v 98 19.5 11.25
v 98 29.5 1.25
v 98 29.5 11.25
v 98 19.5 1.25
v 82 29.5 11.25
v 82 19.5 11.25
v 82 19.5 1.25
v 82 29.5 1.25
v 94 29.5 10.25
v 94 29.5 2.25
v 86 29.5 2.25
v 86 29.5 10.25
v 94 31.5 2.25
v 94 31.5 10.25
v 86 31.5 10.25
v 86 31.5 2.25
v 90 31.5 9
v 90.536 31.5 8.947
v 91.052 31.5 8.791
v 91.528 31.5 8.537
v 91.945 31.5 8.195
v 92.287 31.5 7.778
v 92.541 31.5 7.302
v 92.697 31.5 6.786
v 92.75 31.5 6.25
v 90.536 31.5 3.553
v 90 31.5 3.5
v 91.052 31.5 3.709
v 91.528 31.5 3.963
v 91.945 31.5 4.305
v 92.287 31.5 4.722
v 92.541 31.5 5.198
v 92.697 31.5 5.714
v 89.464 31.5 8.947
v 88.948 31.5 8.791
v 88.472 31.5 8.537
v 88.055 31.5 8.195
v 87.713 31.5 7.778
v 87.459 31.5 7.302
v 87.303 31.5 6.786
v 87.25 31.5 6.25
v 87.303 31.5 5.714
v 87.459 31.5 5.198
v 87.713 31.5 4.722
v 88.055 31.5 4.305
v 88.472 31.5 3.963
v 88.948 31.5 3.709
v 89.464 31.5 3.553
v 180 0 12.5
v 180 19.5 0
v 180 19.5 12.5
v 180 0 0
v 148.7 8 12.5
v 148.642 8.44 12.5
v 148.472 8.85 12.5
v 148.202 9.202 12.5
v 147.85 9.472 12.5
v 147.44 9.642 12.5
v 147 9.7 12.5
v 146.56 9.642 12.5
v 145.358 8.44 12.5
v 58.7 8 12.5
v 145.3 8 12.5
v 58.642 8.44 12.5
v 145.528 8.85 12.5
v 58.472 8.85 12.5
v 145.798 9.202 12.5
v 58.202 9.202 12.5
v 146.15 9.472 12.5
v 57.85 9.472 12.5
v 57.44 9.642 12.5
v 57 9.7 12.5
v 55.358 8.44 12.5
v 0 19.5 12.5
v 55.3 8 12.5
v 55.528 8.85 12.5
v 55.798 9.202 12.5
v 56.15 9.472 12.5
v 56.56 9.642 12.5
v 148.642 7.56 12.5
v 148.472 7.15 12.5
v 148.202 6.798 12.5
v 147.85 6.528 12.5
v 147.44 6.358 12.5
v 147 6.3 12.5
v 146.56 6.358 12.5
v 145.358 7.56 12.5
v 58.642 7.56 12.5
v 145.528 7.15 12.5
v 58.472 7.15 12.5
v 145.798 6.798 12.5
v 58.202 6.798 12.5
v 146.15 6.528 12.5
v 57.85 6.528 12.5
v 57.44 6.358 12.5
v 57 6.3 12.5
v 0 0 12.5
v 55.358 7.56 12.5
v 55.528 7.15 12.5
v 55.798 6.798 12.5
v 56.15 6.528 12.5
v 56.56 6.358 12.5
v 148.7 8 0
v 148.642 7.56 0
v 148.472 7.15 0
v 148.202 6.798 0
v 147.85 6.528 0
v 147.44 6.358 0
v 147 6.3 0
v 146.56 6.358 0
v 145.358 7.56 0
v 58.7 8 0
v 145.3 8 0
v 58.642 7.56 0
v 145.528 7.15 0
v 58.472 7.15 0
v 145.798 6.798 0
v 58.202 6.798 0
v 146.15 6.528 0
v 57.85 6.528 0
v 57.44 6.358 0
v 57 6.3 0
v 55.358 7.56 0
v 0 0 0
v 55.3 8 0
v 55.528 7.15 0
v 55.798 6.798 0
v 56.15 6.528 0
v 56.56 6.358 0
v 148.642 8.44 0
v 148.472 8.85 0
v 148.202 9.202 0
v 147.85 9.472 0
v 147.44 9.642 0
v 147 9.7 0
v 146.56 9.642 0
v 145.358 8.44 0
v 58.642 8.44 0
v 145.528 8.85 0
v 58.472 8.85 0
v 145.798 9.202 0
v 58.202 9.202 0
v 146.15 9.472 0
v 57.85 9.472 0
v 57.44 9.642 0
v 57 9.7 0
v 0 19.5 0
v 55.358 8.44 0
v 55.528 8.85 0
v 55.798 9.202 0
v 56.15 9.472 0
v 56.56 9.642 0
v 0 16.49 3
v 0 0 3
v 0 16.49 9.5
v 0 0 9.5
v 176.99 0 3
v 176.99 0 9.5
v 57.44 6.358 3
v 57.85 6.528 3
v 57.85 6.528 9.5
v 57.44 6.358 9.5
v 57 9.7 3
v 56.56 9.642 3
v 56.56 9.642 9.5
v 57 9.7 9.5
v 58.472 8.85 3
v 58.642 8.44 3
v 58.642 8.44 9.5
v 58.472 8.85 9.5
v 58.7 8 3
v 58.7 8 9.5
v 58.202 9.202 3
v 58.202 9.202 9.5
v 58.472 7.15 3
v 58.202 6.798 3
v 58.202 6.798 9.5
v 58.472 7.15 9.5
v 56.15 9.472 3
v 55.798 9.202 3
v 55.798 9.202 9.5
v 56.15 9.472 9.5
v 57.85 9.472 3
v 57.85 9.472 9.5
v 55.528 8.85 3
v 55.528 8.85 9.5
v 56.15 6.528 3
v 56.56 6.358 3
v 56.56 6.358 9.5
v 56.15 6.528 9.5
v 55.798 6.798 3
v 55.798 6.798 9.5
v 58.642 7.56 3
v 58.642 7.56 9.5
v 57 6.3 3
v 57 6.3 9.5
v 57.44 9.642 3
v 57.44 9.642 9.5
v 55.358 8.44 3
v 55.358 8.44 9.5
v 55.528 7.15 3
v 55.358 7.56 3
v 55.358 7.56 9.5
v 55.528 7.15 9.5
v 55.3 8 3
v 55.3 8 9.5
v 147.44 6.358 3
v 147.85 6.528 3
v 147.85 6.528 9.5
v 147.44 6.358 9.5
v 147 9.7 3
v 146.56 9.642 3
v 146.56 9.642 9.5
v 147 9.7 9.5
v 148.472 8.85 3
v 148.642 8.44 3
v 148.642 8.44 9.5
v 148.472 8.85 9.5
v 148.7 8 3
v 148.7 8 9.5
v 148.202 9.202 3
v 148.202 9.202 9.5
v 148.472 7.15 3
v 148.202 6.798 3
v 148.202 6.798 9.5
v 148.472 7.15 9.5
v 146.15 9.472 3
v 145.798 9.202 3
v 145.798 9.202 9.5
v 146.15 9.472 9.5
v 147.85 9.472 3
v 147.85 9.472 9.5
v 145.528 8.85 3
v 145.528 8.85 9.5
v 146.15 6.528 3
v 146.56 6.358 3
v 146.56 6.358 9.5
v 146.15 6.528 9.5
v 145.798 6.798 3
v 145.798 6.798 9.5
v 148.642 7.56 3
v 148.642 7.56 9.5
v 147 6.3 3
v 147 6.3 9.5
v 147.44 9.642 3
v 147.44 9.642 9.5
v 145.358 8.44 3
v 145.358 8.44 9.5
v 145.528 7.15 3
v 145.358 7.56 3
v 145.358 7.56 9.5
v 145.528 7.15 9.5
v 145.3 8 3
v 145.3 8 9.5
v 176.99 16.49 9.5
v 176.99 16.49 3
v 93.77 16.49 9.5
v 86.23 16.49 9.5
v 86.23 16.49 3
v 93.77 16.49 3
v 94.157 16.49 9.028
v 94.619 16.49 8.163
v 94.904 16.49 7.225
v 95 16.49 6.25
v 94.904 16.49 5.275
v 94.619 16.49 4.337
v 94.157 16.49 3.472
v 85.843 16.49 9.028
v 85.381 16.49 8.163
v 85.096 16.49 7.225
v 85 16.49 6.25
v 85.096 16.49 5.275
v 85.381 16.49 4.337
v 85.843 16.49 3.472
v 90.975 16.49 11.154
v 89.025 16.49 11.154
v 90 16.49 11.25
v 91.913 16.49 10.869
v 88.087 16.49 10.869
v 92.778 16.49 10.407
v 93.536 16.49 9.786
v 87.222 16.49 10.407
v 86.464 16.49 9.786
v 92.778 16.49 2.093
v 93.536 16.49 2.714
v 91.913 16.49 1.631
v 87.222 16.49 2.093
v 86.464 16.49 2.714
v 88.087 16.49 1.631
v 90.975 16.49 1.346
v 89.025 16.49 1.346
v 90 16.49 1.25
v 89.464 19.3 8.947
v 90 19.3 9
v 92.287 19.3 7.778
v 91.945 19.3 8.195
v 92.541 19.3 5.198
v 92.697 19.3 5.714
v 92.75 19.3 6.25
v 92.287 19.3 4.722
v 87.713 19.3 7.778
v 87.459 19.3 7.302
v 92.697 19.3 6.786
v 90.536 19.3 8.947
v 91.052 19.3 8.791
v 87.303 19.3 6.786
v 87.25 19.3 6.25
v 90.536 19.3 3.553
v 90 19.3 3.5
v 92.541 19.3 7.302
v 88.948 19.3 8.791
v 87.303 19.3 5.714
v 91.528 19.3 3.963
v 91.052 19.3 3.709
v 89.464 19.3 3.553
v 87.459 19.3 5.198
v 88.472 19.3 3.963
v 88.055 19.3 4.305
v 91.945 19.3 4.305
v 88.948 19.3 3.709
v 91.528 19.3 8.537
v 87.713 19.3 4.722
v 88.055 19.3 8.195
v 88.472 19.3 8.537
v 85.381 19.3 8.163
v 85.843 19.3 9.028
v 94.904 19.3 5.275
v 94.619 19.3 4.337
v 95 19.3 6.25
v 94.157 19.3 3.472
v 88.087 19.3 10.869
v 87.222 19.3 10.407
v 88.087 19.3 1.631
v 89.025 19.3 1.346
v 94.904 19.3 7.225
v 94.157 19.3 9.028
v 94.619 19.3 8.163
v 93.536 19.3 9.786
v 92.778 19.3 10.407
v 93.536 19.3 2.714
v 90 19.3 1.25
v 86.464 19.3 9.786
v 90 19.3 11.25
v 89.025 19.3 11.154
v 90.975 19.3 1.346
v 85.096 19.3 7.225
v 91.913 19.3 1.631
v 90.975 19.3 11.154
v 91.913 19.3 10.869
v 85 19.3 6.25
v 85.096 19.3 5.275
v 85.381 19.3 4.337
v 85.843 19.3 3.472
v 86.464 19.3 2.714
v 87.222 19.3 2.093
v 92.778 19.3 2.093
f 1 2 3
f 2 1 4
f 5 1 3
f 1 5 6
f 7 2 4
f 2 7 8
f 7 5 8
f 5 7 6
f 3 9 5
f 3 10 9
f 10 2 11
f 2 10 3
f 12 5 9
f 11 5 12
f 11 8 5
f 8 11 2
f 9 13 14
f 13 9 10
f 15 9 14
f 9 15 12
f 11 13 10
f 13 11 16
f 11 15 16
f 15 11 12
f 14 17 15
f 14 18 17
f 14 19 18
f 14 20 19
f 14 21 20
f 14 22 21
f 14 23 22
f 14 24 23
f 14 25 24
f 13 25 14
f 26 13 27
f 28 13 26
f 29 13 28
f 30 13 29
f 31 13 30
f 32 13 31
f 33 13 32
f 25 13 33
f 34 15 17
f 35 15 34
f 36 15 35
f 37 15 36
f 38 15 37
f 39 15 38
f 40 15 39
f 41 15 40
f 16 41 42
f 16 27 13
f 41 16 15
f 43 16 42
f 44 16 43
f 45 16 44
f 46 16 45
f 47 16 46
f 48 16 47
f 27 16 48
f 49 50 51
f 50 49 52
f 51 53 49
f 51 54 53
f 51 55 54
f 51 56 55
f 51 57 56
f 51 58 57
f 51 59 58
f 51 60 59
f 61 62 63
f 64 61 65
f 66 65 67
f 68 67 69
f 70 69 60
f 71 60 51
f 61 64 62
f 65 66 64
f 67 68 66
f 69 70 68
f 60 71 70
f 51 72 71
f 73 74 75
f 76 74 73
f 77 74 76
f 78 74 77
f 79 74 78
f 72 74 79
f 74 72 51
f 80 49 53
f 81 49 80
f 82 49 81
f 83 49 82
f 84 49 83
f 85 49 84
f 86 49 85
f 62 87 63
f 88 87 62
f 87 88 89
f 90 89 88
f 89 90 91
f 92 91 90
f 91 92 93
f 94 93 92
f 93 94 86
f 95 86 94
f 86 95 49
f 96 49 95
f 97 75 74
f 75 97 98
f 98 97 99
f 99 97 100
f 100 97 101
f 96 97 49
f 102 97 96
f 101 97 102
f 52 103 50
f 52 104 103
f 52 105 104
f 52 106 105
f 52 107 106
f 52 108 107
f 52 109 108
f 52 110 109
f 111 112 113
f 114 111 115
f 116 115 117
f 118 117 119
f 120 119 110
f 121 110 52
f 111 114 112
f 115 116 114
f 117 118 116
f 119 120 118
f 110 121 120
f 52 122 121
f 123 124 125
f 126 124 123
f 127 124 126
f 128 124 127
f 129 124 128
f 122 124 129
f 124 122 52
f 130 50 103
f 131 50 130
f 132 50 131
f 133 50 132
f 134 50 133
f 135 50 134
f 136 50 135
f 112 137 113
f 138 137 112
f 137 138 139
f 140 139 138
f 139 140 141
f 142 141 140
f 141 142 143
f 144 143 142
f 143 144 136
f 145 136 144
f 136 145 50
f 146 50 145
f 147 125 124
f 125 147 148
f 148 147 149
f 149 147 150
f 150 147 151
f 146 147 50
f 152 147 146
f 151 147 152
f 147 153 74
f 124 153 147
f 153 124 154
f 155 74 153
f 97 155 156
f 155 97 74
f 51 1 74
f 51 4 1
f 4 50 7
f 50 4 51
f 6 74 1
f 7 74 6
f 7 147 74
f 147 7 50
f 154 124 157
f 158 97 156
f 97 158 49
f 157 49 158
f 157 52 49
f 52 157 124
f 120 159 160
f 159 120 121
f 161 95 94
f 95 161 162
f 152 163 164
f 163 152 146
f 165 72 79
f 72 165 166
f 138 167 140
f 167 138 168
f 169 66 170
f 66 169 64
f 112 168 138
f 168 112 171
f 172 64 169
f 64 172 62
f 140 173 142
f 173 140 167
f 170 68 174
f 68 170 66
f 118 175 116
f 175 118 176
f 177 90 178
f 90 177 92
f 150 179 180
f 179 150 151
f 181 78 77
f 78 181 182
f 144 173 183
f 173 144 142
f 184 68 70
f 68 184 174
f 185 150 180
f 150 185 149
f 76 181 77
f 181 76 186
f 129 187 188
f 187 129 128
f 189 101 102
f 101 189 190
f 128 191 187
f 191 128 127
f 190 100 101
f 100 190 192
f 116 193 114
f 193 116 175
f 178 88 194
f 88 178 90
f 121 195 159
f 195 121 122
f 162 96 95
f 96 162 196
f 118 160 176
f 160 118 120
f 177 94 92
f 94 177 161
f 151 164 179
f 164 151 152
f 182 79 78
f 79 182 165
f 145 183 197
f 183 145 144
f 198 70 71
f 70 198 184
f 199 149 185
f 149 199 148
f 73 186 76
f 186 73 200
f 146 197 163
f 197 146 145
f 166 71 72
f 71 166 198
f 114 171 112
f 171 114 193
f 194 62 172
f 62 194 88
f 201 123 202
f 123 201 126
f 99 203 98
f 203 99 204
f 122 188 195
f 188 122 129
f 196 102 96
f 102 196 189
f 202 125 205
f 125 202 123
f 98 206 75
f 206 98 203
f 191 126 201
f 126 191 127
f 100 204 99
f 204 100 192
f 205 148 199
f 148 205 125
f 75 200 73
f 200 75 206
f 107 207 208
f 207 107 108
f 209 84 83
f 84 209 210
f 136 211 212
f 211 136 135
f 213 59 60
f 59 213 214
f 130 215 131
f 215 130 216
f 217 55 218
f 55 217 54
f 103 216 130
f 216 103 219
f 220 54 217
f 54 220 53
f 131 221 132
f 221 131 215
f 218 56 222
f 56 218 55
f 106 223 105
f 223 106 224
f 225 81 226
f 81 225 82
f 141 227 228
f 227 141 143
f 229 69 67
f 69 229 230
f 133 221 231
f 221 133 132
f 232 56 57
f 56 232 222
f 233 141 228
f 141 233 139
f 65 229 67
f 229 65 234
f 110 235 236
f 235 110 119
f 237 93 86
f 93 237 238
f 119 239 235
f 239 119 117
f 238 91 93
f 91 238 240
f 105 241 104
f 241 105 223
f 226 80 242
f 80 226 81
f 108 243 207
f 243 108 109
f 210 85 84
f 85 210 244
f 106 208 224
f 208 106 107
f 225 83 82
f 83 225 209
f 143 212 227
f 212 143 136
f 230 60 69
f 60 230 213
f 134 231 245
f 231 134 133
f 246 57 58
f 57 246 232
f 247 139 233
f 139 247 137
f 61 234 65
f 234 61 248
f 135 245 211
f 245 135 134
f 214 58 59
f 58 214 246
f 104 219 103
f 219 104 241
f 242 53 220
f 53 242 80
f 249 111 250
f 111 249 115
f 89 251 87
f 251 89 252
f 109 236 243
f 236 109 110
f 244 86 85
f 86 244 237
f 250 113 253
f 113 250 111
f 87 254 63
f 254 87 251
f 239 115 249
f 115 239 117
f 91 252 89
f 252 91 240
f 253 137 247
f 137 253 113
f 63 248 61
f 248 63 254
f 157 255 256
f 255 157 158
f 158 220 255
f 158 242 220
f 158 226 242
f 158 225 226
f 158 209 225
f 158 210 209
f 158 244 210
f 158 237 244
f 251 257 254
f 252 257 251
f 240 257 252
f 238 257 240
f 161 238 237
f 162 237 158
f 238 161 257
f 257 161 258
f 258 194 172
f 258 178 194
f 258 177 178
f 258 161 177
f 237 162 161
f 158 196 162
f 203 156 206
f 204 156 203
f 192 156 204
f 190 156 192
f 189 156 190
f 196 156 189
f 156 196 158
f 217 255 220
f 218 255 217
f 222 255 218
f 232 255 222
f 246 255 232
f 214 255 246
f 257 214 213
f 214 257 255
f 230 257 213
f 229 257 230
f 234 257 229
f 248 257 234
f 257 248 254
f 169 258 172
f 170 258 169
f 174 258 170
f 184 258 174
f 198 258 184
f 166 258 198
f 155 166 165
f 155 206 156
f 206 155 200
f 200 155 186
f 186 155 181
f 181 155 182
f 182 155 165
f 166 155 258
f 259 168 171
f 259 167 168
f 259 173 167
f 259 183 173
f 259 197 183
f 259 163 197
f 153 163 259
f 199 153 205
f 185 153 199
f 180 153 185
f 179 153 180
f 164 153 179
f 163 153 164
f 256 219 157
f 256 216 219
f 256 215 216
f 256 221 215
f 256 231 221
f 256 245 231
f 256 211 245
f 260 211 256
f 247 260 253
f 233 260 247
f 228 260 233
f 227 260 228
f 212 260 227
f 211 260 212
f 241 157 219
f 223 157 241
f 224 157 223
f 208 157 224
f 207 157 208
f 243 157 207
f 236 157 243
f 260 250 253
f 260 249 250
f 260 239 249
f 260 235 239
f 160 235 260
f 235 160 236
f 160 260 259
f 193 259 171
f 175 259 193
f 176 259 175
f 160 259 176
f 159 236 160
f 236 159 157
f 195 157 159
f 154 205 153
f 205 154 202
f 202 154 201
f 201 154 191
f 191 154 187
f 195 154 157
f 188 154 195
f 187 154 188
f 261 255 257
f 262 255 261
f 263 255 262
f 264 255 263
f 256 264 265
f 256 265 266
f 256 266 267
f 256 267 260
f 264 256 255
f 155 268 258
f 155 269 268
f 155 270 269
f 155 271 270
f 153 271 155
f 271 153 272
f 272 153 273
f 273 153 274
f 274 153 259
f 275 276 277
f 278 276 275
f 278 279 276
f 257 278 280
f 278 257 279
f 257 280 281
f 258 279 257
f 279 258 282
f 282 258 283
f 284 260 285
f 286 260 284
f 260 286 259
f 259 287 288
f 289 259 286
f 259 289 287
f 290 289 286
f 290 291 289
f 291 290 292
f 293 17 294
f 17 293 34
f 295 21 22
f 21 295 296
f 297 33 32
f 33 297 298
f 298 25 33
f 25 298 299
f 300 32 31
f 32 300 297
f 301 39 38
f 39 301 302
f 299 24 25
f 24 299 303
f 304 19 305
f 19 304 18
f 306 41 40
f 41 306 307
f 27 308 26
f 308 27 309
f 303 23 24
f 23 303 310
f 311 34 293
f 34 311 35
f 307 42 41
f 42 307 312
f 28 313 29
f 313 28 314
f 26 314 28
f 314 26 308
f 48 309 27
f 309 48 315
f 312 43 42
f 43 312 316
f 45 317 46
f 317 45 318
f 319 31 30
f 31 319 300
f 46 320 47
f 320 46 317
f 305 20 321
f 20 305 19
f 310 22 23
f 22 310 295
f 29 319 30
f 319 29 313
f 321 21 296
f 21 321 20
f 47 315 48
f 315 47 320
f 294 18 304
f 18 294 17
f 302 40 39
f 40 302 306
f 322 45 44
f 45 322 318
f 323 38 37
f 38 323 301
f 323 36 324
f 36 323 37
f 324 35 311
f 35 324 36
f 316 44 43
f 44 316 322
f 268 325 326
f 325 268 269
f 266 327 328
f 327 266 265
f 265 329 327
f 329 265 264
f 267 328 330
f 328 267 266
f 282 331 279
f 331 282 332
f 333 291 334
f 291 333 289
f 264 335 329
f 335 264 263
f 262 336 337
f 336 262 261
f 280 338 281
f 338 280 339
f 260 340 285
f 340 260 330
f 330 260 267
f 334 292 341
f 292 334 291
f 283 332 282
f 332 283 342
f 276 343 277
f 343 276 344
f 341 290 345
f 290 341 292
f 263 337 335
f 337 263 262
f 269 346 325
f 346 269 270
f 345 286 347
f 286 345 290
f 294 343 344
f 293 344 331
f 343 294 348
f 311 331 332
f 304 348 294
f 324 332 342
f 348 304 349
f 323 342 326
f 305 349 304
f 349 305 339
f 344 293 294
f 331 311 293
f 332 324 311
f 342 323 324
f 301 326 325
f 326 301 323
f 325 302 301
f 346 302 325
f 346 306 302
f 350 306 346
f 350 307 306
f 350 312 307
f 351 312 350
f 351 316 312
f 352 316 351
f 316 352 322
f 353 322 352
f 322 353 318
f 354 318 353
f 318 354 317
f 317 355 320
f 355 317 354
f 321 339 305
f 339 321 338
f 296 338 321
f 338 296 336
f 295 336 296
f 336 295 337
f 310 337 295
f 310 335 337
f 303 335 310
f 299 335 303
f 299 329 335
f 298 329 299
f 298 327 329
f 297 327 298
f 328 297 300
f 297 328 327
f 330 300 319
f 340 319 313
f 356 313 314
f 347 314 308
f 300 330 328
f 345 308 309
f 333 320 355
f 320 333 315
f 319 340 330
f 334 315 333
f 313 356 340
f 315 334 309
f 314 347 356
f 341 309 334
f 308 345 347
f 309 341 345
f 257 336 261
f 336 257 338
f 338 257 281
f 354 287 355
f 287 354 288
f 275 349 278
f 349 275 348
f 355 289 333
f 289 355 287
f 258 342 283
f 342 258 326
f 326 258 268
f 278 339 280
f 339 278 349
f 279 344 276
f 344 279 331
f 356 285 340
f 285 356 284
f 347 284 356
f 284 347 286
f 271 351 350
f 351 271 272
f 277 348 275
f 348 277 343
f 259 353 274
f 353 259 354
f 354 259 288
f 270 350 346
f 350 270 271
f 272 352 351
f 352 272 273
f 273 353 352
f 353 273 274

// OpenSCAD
// =====================================================================
// FUZE / Helios — Down Sandwich Test Frame  (V3 clamshell, 2026-06-04)
// Two separate halves, NO printed hinge. Lift the lid right off to lay an
// even layer of free-form down in the tray; set the lid back (a perimeter
// set the lid back and clamp with 4 corner screws. Mesh on BOTH outer
// faces. Hangs vertically: a top rail slides into a side-loading C-channel.
//
//   PART = "tray"    -> deep half (10 mm down cavity)        [print 1]
//   PART = "lid"     -> mesh lid half                        [print 1]
//   PART = "channel" -> side-loading C-channel (load cell)   [print 1]
//   PART = "both"    -> tray + lid + channel preview
//
// Material: PC (PETG later). Print each half FLAT, mesh-face DOWN.
// MESH: pause-embed at layer 8 = Z 1.5 mm @ 0.2 mm layers (both halves).
// =====================================================================

PART = "channel";
$fn = 48;

SIZE     = 250;     // outer square (mm)
WALL     = 4;       // frame wall thickness
CAV      = 10;      // down cavity depth (tray)
FLOOR_H  = 3.0;     // mesh-support rib plane (1.5 backing + 1.5 cap, mesh @ layer 8)
RIB_W    = 2.0;     // rib width
CELLS    = 4;       // NxN support-rib cells
CLR      = 0.4;     // fit clearance

TRAY_T = FLOOR_H + CAV;   // tray wall height (13)
LID_RIM = 5.0;            // lid wall height
LID_T   = FLOOR_H + LID_RIM;


// corner closure screws (M3)
SCREW_CLR = 3.4;    // clearance hole (lid)
INSERT_D  = 4.2;    // M3 heat-set insert bore (tray)
INSERT_H  = 6.0;
BOSS_D    = 9;
INSET     = BOSS_D/2 + 2;   // boss center inset from the corner

// top hang tab (flat, in the plane of the frame, sticks OUT past the top edge so
// it never conflicts with the lid) + side-loading C-channel that grips the tab.
RAIL_LEN = 150;   // tab width along the top edge (X)
RAIL_OUT = 16;    // how far the tab sticks out past the top edge (Y)
RAIL_T   = 6;     // tab thickness (Z) — what the channel grips
CH_CLR = 0.5; CH_WALL = 3; CH_LEN = RAIL_LEN + 30;
// load-cell mount boss — stepped standoff on the BACK face (the face OPPOSITE the slot),
// so it mounts up to the load cell with the frame hanging straight down below it.
LC_TIP_W   = 8;     // tip width along the channel (X) — seats in the 8 mm gap between the load-cell screws
LC_BASE_W  = 16;    // shoulder width (X)
LC_TIP_ZH  = 8;     // tip height (Z)
LC_BASE_ZH = 10;    // shoulder height (Z)
LC_BASE_H  = 10;    // shoulder protrusion off the back face (+Y) — clears the 10 mm safety screw
LC_TIP_H   = 12;    // tip protrusion (+Y) total
LC_SCREW_D = 5.5;   // attach-screw clearance — SET to your load-cell thread (M5=5.5, M4=4.5, M6=6.5)
LC_HEAD_D  = 10;    // screw-head recess Ø
LC_HEAD_H  = 2.8;   // screw-head recess depth
// locking pins: 2 holes through channel-lip + tab + channel-lip; drop M3 screws/pins
LOCK_D    = 3.4;          // M3 clearance / 3 mm pin
LOCK_SP   = 90;           // spacing between the 2 lock holes
LOCK_Y    = RAIL_OUT/2;   // depth into the tab where the holes sit

WIN = SIZE - 2*WALL;
EPS = 0.01;

// ---------------------------------------------------------------
module sq(s,h){ cube([s,s,h]); }

module rib_grid(h){
    step = WIN/CELLS;
    intersection(){
        union(){
            for(i=[0:CELLS]) translate([i*step-RIB_W/2,0,0]) cube([RIB_W,WIN,h]);
            for(j=[0:CELLS]) translate([0,j*step-RIB_W/2,0]) cube([WIN,RIB_W,h]);
        }
        cube([WIN,WIN,h]);
    }
}
module ring(h){ difference(){ sq(SIZE,h); translate([WALL,WALL,-EPS]) sq(WIN,h+2*EPS);} }

// 4 corner positions
function corners() = [[INSET,INSET],[SIZE-INSET,INSET],[INSET,SIZE-INSET],[SIZE-INSET,SIZE-INSET]];

// registration via the corner bosses: lid POST drops into tray SOCKET, then screw.
// Socket and post are DECOUPLED so the post can shrink without re-cutting the tray.
REG_SOCKET_D = 6.8;   // TRAY socket diameter — UNCHANGED (matches the 6 trays already printed)
REG_POST_D   = 5.8;   // LID post diameter — loose slip fit (~0.5mm/side; was 6.5 = too tight)
REG_H        = 3.0;   // engagement depth (socket depth = post height)

module tray_bosses(){          // socket on top (receives the lid post) + insert below it
    for(c=corners()) translate([c[0],c[1],0])
        difference(){
            cylinder(d=BOSS_D,h=TRAY_T);
            translate([0,0,TRAY_T-REG_H]) cylinder(d=REG_SOCKET_D, h=REG_H+EPS, $fn=32);           // registration socket
            translate([0,0,TRAY_T-REG_H-INSERT_H]) cylinder(d=INSERT_D, h=INSERT_H+EPS, $fn=24);   // heat-set insert bore (below socket)
        }
}
module lid_bosses(){           // boss + registration POST above the mating face; screw hole through
    for(c=corners()) translate([c[0],c[1],0])
        difference(){
            union(){ cylinder(d=BOSS_D,h=LID_T); translate([0,0,LID_T-EPS]) cylinder(d=REG_POST_D, h=REG_H+EPS, $fn=32); }
            translate([0,0,-EPS]) cylinder(d=SCREW_CLR, h=LID_T+REG_H+2*EPS, $fn=24);
        }
}

// Flat hang tab: a plate sticking OUT past the top edge (+Y), thickness in Z.
// Sits at the top of the tray wall so the lid (which stacks in +Z) clears it.
module hang_tab(){
    difference(){
        translate([(SIZE-RAIL_LEN)/2, SIZE-EPS, TRAY_T-RAIL_T])
            cube([RAIL_LEN, RAIL_OUT+EPS, RAIL_T]);
        for(sx=[SIZE/2-LOCK_SP/2, SIZE/2+LOCK_SP/2])
            translate([sx, SIZE+LOCK_Y, TRAY_T-RAIL_T-EPS]) cylinder(d=LOCK_D, h=RAIL_T+2*EPS, $fn=24);
    }
}
// C-channel grips the tab top+bottom (Z) and the back (Y); the tab slides in from
// one X end to an end-stop; the front (toward the frame) is open so the neck passes.
module c_channel(){
    slotY = RAIL_OUT + CH_CLR;            // tab depth into the channel (Y)
    slotZ = RAIL_T + CH_CLR;              // tab thickness (Z)
    outerY = slotY + CH_WALL;             // back wall
    outerZ = slotZ + 2*CH_WALL;           // top + bottom lips
    ceil   = CH_WALL + slotZ;             // slot ceiling z
    difference(){
        union(){
            cube([CH_LEN, outerY, outerZ]);
            // stepped mount boss on the BACK (+Y) face, dead center, centered in height:
            // 16x10 shoulder (protrudes 0-10mm in +Y, clears the 10mm safety screw) ->
            // 8x8 tip (10-12mm, seats in the 8mm gap between the load-cell screws).
            translate([CH_LEN/2, outerY-EPS, outerZ/2]){
                translate([-LC_BASE_W/2, 0, -LC_BASE_ZH/2]) cube([LC_BASE_W, LC_BASE_H+EPS, LC_BASE_ZH]);
                translate([-LC_TIP_W/2, LC_BASE_H, -LC_TIP_ZH/2]) cube([LC_TIP_W, (LC_TIP_H-LC_BASE_H)+EPS, LC_TIP_ZH]);
            }
        }
        // tab slot: open at X=0 (insert) and Y=0 (front, frame hangs straight down out here); far X end = stop
        translate([-EPS, -EPS, CH_WALL]) cube([CH_LEN-CH_WALL, slotY, slotZ]);
        // LOCK holes (vertical) through top lip + tab + bottom lip, aligned at full seat
        for(sx=[(CH_LEN-CH_WALL)-RAIL_LEN/2 - LOCK_SP/2, (CH_LEN-CH_WALL)-RAIL_LEN/2 + LOCK_SP/2])
            translate([sx, LOCK_Y, -EPS]) cylinder(d=LOCK_D, h=outerZ+2*EPS, $fn=24);
        // ATTACH screw: +Y through the back wall + boss into the load-cell thread; head
        // recessed into the slot's back wall so it never blocks the sliding tab ("subset").
        translate([CH_LEN/2, slotY-EPS, outerZ/2]) rotate([-90,0,0]) cylinder(d=LC_SCREW_D, h=(outerY-slotY)+LC_TIP_H+2*EPS, $fn=32);
        translate([CH_LEN/2, slotY-EPS, outerZ/2]) rotate([-90,0,0]) cylinder(d=LC_HEAD_D, h=LC_HEAD_H+EPS, $fn=32);
    }
}

// ---------------- HALVES ----------------
module tray_half(){
    union(){
        translate([WALL,WALL,0]) rib_grid(FLOOR_H);
        ring(TRAY_T);
        tray_bosses();
        hang_tab();
    }
}
// coin-pry notches: bites out of the lid's top-outer edge at 2 opposite sides, so a
// coin/flat screwdriver slides into the seam against the tray edge and twists to pop apart.
PRY_W = 16; PRY_DEEP = 2.5; PRY_H = 4;
module pry_notches(){
    yc = SIZE/2;
    translate([-EPS,        yc-PRY_W/2, LID_T-PRY_H]) cube([PRY_DEEP+EPS, PRY_W, PRY_H+2*EPS]);   // left edge
    translate([SIZE-PRY_DEEP, yc-PRY_W/2, LID_T-PRY_H]) cube([PRY_DEEP+EPS, PRY_W, PRY_H+2*EPS]); // right edge
}
module lid_half(){
    difference(){
        union(){
            translate([WALL,WALL,0]) rib_grid(FLOOR_H);
            ring(LID_T);
            lid_bosses();
        }
        pry_notches();
    }
}

// ---------------- selector ----------------
if      (PART=="tray")    tray_half();
else if (PART=="lid")     lid_half();
else if (PART=="channel") c_channel();
else { tray_half(); translate([SIZE+30,0,0]) lid_half(); translate([0,-70,0]) c_channel(); }

// =====================================================================
// ASSEMBLY
// 1. Print tray + lid (mesh-face DOWN, pause layer 8 for mesh) + 1 C-channel, PC.
// 2. Stretch/embed bridal mesh on each rib grid.
// 3. Press 4x M3 heat-set inserts into the tray corner bosses.
// 4. Lay a standardized small even down layer in the tray. Set the lid on — the
//    align the 4 corner boss holes and drive 4x M3 into the tray inserts.
// 5. Bolt the C-channel to the inverted load cell; slide the tray's top rail in
//    from the open end to the end-stop; tare; run protocol.
// To reload: back out the 4 screws, lift the lid straight off.
// =====================================================================
